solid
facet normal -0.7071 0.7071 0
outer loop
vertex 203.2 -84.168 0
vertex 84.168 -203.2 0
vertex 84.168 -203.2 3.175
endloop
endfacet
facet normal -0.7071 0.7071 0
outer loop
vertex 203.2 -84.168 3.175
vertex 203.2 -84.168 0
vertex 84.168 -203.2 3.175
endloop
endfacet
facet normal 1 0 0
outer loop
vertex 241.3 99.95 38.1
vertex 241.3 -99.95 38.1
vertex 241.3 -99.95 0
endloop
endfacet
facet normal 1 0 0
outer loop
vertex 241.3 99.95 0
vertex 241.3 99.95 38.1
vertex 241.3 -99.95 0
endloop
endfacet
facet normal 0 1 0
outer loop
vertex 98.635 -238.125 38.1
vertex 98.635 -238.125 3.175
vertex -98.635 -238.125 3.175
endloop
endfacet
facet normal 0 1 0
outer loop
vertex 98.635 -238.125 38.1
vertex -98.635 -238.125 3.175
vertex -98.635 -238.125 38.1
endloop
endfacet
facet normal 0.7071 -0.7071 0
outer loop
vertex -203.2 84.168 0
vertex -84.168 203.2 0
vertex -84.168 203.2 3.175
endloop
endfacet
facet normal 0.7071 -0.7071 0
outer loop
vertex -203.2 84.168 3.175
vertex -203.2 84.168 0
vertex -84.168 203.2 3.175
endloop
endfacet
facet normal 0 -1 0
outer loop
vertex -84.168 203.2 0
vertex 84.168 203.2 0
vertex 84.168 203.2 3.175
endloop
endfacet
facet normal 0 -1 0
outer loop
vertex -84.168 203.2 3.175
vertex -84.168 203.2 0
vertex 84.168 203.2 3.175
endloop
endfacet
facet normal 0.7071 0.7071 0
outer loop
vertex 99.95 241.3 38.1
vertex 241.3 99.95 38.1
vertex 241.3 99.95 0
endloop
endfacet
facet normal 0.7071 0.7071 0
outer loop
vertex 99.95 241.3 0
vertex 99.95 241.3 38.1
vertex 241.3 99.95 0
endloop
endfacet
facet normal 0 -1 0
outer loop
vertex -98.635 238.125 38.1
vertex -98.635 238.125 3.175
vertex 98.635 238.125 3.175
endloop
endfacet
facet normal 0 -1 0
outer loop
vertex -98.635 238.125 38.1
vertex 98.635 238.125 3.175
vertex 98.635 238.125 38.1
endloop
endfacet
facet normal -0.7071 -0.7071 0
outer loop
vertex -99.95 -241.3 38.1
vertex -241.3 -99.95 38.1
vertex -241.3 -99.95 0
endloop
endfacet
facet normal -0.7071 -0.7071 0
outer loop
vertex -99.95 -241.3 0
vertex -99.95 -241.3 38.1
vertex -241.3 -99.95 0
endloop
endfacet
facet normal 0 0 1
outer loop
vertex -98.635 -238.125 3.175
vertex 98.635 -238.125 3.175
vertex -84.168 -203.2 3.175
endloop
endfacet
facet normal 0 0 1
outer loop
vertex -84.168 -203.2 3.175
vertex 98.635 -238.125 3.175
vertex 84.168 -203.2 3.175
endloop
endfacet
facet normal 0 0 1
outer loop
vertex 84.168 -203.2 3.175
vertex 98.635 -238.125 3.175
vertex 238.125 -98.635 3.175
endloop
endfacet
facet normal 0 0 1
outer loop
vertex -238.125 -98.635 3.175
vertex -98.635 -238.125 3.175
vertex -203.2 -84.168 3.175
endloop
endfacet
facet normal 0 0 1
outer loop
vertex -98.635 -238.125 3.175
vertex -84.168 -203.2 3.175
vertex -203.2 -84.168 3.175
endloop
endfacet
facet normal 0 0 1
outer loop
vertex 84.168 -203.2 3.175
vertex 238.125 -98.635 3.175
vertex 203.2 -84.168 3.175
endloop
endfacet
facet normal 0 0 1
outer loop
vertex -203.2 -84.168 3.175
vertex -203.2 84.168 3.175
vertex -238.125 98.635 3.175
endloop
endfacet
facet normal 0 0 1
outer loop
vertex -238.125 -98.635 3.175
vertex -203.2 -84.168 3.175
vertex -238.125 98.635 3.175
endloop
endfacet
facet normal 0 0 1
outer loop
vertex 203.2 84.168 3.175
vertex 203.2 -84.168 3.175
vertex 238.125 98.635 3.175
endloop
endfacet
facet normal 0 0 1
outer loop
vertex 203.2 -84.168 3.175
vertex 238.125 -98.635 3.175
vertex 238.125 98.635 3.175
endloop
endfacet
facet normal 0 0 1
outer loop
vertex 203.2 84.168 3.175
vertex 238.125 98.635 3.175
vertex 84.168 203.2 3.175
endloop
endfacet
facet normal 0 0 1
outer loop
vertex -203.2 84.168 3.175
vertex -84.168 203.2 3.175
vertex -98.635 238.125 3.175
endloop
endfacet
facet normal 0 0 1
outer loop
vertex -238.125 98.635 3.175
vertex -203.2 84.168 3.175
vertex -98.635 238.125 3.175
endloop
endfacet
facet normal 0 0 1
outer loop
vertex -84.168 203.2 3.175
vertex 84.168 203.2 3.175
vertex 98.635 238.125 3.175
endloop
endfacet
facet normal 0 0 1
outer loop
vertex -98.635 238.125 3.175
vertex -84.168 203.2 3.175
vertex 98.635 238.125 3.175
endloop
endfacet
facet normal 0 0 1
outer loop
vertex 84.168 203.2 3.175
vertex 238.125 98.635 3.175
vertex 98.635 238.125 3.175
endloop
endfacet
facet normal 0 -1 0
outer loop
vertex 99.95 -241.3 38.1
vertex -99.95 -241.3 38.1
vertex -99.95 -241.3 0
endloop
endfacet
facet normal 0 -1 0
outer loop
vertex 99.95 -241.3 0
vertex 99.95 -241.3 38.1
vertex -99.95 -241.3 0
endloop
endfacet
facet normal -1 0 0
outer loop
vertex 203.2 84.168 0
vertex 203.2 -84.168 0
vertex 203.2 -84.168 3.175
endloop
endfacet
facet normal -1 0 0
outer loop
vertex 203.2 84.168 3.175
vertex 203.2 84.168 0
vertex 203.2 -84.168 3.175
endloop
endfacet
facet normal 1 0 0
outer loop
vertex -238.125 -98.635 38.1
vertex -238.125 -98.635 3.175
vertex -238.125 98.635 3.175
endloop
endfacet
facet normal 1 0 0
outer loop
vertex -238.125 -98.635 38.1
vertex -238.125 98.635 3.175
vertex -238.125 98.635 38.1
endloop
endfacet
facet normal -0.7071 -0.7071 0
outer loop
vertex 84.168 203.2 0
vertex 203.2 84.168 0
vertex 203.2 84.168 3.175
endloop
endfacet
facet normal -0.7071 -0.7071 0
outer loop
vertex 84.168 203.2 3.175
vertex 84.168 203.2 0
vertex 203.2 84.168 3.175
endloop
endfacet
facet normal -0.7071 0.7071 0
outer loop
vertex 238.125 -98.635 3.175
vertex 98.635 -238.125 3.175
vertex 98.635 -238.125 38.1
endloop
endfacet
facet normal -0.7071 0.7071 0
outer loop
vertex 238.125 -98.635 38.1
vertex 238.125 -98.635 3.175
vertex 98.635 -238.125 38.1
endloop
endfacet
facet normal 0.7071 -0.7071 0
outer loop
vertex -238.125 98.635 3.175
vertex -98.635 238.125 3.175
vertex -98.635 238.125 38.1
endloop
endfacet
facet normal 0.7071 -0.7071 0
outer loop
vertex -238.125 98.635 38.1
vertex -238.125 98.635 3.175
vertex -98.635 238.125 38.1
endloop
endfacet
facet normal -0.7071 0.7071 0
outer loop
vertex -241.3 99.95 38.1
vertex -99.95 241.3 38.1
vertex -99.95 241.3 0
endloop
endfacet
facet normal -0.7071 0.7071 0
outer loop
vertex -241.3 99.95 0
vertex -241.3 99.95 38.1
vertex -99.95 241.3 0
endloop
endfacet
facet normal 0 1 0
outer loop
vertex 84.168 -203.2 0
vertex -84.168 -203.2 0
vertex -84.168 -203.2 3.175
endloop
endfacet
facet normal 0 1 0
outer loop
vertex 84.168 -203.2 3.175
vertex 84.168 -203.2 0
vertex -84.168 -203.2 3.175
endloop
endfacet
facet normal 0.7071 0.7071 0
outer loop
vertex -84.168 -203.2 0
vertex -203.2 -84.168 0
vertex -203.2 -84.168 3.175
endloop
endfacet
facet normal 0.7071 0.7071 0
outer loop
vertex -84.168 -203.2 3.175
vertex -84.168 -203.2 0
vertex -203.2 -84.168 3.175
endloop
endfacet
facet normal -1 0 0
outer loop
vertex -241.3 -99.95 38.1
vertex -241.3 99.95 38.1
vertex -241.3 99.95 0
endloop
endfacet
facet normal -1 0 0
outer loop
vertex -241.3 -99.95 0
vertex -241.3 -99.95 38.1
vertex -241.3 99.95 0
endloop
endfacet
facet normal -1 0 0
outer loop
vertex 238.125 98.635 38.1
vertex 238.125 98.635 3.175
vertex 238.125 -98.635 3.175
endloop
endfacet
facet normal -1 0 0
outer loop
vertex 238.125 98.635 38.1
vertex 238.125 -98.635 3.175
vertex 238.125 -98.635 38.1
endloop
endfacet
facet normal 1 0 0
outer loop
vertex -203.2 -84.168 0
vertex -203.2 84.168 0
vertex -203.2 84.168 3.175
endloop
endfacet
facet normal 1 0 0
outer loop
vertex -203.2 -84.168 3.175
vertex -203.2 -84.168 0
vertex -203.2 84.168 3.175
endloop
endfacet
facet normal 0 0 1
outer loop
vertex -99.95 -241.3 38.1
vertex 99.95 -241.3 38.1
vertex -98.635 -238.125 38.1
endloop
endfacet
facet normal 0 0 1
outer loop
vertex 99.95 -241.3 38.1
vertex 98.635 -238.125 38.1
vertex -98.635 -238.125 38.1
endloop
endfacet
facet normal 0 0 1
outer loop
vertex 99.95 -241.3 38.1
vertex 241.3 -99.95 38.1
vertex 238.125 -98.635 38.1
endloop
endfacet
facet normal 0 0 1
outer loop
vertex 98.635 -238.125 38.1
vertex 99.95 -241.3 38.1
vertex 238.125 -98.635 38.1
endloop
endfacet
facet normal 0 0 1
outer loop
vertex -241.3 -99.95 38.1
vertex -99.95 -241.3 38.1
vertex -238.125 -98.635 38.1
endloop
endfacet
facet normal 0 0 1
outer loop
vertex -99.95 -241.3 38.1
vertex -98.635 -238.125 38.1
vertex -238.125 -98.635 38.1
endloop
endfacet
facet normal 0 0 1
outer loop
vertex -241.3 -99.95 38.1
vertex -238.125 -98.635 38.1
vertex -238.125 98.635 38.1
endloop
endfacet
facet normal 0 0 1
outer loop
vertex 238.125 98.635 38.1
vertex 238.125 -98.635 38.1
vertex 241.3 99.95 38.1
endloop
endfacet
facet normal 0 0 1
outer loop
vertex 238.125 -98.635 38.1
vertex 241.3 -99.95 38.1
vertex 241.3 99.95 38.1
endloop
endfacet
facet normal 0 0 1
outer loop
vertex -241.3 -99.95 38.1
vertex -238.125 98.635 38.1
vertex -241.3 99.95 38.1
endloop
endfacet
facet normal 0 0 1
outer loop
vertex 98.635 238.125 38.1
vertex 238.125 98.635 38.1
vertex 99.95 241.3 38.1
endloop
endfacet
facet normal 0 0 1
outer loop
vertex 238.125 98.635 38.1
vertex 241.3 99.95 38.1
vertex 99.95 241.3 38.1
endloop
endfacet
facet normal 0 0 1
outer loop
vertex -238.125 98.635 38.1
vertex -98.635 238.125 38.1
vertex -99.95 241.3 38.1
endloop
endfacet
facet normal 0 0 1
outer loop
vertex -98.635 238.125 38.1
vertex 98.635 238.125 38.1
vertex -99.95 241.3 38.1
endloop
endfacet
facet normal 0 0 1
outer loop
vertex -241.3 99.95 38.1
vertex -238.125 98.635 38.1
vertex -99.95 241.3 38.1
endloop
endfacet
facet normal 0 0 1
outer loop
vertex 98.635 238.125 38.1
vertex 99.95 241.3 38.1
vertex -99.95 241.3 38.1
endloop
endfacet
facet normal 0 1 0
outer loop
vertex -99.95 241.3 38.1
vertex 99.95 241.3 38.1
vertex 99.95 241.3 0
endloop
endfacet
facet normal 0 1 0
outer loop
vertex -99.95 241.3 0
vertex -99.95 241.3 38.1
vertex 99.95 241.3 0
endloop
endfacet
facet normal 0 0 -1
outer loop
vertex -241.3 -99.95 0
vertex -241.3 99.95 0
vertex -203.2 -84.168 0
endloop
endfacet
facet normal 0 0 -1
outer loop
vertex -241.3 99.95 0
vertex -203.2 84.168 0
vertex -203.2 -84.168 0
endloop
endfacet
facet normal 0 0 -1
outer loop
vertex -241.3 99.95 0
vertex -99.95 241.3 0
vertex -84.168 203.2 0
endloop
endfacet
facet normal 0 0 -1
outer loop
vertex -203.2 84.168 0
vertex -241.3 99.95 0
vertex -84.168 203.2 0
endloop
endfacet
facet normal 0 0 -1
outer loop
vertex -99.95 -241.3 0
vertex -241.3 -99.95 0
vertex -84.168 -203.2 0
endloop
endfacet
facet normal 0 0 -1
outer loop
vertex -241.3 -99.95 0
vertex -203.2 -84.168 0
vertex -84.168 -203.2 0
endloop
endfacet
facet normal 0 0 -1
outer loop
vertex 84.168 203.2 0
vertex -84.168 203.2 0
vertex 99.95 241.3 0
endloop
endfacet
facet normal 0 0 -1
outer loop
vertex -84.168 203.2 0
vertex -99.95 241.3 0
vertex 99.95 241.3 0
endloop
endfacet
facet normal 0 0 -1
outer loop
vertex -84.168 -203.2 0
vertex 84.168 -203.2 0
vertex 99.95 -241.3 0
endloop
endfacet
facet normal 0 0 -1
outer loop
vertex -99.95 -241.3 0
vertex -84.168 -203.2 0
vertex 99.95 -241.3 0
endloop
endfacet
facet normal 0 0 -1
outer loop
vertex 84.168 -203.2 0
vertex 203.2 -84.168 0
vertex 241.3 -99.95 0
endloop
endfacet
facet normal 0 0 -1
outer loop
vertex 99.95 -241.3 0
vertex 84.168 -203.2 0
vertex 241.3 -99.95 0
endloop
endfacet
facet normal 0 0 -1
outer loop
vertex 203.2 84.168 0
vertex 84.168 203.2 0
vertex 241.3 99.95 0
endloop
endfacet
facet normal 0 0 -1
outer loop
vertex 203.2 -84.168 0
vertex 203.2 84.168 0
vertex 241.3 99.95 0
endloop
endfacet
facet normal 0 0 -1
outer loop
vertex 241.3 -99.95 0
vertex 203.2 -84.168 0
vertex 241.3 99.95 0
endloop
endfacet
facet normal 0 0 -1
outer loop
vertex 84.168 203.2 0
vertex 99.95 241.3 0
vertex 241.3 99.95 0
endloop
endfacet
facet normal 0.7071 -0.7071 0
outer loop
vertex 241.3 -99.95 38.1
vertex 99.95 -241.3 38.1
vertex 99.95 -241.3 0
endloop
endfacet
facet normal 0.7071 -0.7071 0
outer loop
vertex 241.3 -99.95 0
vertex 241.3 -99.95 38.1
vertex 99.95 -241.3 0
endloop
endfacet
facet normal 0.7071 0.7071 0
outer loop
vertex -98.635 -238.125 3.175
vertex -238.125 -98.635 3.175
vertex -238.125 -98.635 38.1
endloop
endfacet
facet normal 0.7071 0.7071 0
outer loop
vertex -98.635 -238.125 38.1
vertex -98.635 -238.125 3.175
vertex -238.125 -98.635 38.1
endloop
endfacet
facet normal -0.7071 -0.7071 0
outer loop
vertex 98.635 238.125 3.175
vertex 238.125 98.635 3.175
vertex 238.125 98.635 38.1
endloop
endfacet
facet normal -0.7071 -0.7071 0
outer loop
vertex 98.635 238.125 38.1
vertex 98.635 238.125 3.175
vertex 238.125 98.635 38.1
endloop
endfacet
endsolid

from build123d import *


with BuildPart() as f2:
    # F2: sweep along a path in F1
    with BuildLine(Plane.XY) as f2_path:
        Line((-241.3, 0), (-241.3, 99.9497326006))
        Line((-241.3, 99.9497326006), (-99.9497326006, 241.3))
        Line((-99.9497326006, 241.3), (99.9497326006, 241.3))
        Line((99.9497326006, 241.3), (241.3, 99.9497326006))
        Line((241.3, 99.9497326006), (241.3, -99.9497326006))
        Line((241.3, -99.9497326006), (99.9497326006, -241.3))
        Line((99.9497326006, -241.3), (-99.9497326006, -241.3))
        Line((-99.9497326006, -241.3), (-241.3, -99.9497326006))
        Line((-241.3, -99.9497326006), (-241.3, 0))
    # F0 (on Front) → F2 (sweep)
    with BuildSketch(Plane.XZ):
        Polygon((-238.125, 38.1), (-241.3, 38.1), (-241.3, 0), (-203.2, 0), (-203.2, 3.175), (-238.125, 3.175), align=None)
    sweep(path=f2_path.line, transition=Transition.RIGHT)


solid = f2.part
